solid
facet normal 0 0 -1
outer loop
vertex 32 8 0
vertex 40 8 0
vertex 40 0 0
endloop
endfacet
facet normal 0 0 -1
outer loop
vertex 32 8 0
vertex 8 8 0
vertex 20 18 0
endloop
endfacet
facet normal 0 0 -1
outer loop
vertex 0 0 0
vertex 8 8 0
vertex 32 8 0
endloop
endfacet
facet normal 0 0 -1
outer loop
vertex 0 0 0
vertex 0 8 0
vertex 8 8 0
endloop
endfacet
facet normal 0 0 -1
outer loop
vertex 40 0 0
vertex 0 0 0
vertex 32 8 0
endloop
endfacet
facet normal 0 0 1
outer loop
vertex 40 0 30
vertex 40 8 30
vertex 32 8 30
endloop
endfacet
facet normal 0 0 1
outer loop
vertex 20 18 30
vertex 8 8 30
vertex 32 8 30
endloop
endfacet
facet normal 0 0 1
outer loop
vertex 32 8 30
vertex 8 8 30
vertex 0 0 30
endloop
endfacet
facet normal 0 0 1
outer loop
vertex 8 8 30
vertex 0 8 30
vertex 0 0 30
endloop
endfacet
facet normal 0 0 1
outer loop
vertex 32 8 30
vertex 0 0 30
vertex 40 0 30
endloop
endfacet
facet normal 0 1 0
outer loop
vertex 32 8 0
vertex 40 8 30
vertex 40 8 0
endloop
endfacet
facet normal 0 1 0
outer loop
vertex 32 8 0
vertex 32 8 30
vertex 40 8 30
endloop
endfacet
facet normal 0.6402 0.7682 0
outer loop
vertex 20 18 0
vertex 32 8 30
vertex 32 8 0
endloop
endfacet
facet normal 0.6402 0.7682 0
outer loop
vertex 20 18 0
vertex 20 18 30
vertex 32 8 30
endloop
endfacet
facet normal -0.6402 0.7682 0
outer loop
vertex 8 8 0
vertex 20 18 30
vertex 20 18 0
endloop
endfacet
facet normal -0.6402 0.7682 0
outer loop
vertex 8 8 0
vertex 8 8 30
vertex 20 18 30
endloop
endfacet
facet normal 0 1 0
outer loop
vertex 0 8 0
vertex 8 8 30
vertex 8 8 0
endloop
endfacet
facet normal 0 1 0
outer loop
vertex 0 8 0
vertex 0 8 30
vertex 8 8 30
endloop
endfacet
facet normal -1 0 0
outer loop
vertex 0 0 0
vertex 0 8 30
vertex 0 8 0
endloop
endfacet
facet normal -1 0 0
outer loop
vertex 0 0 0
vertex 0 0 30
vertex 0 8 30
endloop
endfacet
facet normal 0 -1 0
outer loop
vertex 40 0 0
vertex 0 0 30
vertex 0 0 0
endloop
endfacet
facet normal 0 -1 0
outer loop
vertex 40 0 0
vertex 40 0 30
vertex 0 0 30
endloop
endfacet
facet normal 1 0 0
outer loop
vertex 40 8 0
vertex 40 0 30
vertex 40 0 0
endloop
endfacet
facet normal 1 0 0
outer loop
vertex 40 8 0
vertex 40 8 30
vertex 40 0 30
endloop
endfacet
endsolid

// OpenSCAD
$fn = 32;

// ----------------------------------------------------------------------
// V guide rail: vrib, 40 mm wide
// ----------------------------------------------------------------------

// --- parameters (mm) ---
rail_w = 40;              // rail width, X
base_t = 8;               // base plate thickness
v_depth = 10;             // V feature depth / height
v_half_w = 12;            // half width of the V at the base face
plate_t = 30;             // rail length, Z (the extrusion height)

profile = [[0, 0], [40, 0], [40, 8], [32, 8], [20, 18], [8, 8], [0, 8]];  // primary outline, 7 points, counter clockwise

// --- the one profile operation ---
linear_extrude(height = plate_t) polygon(points = profile);
